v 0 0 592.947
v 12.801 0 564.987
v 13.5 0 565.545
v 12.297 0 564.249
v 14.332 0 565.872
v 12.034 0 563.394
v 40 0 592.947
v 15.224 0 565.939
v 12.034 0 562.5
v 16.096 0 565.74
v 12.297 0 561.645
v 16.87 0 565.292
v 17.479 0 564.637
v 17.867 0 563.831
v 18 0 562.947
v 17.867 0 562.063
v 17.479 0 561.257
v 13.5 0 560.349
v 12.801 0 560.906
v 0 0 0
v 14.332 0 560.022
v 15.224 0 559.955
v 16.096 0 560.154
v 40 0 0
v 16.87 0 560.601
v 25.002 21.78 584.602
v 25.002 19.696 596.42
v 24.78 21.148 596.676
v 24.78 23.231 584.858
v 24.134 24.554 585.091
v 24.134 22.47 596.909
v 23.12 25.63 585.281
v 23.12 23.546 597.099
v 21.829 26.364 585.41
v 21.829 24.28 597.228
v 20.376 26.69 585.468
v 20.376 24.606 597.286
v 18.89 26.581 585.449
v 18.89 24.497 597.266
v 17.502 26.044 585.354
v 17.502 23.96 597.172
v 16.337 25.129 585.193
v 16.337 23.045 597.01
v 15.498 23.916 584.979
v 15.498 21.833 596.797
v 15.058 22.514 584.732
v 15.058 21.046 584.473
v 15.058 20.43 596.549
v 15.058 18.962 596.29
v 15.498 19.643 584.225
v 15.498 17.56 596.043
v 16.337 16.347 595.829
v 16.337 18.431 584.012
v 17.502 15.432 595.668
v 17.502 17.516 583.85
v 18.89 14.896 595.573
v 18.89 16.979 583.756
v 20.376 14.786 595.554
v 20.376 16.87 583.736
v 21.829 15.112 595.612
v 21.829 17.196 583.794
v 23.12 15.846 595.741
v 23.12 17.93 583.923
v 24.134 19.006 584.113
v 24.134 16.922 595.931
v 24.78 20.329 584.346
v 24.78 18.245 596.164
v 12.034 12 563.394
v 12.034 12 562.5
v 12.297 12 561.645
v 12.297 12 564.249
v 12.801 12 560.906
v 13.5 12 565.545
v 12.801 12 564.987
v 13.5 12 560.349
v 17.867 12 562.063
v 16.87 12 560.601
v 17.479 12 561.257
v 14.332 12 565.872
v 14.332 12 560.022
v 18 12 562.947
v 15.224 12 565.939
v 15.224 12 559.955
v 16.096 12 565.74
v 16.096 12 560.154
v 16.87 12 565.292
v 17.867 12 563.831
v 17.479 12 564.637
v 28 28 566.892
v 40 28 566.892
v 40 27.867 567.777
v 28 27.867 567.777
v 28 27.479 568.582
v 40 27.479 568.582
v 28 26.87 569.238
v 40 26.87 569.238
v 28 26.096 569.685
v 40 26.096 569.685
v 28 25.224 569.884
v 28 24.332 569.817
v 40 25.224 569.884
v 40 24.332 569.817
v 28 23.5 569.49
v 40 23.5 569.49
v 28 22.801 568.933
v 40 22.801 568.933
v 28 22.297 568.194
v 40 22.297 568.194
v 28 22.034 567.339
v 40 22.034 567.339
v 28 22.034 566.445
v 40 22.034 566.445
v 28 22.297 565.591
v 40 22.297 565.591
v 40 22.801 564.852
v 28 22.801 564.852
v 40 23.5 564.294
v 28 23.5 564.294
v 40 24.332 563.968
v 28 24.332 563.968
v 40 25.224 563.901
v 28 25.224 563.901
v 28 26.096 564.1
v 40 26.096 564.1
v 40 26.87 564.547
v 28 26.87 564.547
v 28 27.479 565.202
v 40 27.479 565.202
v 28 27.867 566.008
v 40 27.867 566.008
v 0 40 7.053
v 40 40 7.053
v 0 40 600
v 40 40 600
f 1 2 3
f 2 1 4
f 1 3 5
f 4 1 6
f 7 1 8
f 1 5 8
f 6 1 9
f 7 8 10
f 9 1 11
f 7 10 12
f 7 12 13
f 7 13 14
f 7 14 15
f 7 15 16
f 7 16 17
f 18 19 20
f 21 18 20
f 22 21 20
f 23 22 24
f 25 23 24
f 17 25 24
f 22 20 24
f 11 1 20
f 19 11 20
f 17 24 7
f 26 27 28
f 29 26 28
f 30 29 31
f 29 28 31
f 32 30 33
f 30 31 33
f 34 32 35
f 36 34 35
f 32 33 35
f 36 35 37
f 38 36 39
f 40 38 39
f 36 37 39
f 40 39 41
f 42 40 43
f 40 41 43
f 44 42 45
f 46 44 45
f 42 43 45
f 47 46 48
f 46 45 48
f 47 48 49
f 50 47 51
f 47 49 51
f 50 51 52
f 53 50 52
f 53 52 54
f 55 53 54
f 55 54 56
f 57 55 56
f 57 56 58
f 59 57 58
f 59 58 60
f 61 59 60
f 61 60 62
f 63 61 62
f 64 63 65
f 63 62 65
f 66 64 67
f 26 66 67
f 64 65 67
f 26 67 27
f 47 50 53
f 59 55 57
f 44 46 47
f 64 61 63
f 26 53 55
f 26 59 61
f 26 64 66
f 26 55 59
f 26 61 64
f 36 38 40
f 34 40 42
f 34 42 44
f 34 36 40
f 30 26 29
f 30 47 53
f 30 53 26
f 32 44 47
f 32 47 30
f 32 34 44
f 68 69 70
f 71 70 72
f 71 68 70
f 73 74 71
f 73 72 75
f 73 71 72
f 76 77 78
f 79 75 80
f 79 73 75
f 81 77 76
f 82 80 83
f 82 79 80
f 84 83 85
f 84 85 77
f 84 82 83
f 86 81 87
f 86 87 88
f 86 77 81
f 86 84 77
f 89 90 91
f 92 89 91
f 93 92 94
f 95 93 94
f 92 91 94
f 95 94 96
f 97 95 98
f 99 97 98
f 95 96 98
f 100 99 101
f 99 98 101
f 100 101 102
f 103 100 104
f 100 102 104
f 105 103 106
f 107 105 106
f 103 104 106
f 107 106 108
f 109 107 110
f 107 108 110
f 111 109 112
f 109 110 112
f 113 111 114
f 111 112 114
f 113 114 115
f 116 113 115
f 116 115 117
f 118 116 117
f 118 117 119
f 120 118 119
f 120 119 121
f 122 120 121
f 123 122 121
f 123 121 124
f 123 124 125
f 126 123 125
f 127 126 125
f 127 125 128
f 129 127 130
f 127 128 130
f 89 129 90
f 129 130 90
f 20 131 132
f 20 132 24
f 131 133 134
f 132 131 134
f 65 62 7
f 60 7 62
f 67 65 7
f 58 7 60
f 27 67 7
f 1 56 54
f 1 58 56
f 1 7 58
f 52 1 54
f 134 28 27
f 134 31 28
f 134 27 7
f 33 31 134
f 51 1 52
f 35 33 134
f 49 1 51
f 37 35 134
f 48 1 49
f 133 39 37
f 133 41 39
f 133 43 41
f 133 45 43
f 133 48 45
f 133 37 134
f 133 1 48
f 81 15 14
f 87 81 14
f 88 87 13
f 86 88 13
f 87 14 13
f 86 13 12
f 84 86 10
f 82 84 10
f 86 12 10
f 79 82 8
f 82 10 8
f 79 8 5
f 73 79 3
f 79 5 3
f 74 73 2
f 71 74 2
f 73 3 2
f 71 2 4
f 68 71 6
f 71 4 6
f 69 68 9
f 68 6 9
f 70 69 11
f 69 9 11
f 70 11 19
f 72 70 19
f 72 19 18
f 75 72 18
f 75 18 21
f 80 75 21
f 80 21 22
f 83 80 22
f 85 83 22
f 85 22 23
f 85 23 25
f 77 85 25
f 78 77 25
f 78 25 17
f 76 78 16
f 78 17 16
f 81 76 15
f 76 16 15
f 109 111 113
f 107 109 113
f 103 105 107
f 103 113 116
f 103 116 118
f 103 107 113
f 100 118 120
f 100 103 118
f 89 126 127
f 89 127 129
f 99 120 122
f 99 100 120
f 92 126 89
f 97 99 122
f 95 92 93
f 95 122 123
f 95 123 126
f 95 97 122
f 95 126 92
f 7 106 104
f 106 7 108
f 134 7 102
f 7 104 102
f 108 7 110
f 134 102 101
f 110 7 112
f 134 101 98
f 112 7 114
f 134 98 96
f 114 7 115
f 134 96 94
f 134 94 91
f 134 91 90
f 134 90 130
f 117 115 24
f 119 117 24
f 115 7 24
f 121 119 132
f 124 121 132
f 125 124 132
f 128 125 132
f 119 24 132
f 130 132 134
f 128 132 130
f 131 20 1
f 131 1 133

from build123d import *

# Parameters (mm, degrees)
F0_W        = 40
F0_H        = 40
F1_DEPTH    = 600
F3_T1_DEPTH = 247.8831037137
F4_R        = 3
F6_DEPTH    = 12
F5_R        = 3
F7_DEPTH    = 12
F8_R        = 5
F9_DEPTH    = 12


# Not quite as in the source:
# - a fillet or chamfer that OpenCascade refuses, or shapes differently, is made with other operations: its cross-section is extruded or revolved along the edge and cut away or added
# - a feature of the source that left no trace in its solid (it failed there, or was rolled back) is left out


with BuildPart() as f1:
    # F0 (on Top) → F1 (new body)
    with BuildSketch(Plane.XY):
        with Locations((20, 20)):
            Rectangle(F0_W, F0_H)
    extrude(amount=F1_DEPTH)

    # F3: chamfer of 40 x 7.0530792283 on 2 edges, made by hand

    # F3_s2 → F3_t1 (cut)
    with BuildSketch(Plane.YZ.offset(-103.9415518568)):
        Polygon((40, 7.0530792283), (0, 0), (40, 0), align=None)
        Polygon((0, 592.9469207717), (40, 600), (0, 600), align=None)
    extrude(amount=F3_T1_DEPTH, mode=Mode.SUBTRACT)

    # F4 (on face) → F6 (cut)
    with BuildSketch(Plane.XZ):
        with Locations((15, 562.9469207717)):
            Circle(F4_R)
    extrude(amount=-F6_DEPTH, mode=Mode.SUBTRACT)

    # F5 (on face) → F7 (cut)
    with BuildSketch(Plane.YZ.offset(40)):
        with Locations((25, 566.8922969328)):
            Circle(F5_R)
    extrude(amount=-F7_DEPTH, mode=Mode.SUBTRACT)

    # F8 (on face) → F9 (cut)
    with BuildSketch(Plane(origin=(0, -101.3998954134, 575.0673833693), x_dir=(1, 0, 0), z_dir=(0, -0.1736481777, 0.984807753))):
        with Locations((20.0023799473, 122.9641521036)):
            Circle(F8_R)
    extrude(amount=-F9_DEPTH, mode=Mode.SUBTRACT)


solid = f1.part
